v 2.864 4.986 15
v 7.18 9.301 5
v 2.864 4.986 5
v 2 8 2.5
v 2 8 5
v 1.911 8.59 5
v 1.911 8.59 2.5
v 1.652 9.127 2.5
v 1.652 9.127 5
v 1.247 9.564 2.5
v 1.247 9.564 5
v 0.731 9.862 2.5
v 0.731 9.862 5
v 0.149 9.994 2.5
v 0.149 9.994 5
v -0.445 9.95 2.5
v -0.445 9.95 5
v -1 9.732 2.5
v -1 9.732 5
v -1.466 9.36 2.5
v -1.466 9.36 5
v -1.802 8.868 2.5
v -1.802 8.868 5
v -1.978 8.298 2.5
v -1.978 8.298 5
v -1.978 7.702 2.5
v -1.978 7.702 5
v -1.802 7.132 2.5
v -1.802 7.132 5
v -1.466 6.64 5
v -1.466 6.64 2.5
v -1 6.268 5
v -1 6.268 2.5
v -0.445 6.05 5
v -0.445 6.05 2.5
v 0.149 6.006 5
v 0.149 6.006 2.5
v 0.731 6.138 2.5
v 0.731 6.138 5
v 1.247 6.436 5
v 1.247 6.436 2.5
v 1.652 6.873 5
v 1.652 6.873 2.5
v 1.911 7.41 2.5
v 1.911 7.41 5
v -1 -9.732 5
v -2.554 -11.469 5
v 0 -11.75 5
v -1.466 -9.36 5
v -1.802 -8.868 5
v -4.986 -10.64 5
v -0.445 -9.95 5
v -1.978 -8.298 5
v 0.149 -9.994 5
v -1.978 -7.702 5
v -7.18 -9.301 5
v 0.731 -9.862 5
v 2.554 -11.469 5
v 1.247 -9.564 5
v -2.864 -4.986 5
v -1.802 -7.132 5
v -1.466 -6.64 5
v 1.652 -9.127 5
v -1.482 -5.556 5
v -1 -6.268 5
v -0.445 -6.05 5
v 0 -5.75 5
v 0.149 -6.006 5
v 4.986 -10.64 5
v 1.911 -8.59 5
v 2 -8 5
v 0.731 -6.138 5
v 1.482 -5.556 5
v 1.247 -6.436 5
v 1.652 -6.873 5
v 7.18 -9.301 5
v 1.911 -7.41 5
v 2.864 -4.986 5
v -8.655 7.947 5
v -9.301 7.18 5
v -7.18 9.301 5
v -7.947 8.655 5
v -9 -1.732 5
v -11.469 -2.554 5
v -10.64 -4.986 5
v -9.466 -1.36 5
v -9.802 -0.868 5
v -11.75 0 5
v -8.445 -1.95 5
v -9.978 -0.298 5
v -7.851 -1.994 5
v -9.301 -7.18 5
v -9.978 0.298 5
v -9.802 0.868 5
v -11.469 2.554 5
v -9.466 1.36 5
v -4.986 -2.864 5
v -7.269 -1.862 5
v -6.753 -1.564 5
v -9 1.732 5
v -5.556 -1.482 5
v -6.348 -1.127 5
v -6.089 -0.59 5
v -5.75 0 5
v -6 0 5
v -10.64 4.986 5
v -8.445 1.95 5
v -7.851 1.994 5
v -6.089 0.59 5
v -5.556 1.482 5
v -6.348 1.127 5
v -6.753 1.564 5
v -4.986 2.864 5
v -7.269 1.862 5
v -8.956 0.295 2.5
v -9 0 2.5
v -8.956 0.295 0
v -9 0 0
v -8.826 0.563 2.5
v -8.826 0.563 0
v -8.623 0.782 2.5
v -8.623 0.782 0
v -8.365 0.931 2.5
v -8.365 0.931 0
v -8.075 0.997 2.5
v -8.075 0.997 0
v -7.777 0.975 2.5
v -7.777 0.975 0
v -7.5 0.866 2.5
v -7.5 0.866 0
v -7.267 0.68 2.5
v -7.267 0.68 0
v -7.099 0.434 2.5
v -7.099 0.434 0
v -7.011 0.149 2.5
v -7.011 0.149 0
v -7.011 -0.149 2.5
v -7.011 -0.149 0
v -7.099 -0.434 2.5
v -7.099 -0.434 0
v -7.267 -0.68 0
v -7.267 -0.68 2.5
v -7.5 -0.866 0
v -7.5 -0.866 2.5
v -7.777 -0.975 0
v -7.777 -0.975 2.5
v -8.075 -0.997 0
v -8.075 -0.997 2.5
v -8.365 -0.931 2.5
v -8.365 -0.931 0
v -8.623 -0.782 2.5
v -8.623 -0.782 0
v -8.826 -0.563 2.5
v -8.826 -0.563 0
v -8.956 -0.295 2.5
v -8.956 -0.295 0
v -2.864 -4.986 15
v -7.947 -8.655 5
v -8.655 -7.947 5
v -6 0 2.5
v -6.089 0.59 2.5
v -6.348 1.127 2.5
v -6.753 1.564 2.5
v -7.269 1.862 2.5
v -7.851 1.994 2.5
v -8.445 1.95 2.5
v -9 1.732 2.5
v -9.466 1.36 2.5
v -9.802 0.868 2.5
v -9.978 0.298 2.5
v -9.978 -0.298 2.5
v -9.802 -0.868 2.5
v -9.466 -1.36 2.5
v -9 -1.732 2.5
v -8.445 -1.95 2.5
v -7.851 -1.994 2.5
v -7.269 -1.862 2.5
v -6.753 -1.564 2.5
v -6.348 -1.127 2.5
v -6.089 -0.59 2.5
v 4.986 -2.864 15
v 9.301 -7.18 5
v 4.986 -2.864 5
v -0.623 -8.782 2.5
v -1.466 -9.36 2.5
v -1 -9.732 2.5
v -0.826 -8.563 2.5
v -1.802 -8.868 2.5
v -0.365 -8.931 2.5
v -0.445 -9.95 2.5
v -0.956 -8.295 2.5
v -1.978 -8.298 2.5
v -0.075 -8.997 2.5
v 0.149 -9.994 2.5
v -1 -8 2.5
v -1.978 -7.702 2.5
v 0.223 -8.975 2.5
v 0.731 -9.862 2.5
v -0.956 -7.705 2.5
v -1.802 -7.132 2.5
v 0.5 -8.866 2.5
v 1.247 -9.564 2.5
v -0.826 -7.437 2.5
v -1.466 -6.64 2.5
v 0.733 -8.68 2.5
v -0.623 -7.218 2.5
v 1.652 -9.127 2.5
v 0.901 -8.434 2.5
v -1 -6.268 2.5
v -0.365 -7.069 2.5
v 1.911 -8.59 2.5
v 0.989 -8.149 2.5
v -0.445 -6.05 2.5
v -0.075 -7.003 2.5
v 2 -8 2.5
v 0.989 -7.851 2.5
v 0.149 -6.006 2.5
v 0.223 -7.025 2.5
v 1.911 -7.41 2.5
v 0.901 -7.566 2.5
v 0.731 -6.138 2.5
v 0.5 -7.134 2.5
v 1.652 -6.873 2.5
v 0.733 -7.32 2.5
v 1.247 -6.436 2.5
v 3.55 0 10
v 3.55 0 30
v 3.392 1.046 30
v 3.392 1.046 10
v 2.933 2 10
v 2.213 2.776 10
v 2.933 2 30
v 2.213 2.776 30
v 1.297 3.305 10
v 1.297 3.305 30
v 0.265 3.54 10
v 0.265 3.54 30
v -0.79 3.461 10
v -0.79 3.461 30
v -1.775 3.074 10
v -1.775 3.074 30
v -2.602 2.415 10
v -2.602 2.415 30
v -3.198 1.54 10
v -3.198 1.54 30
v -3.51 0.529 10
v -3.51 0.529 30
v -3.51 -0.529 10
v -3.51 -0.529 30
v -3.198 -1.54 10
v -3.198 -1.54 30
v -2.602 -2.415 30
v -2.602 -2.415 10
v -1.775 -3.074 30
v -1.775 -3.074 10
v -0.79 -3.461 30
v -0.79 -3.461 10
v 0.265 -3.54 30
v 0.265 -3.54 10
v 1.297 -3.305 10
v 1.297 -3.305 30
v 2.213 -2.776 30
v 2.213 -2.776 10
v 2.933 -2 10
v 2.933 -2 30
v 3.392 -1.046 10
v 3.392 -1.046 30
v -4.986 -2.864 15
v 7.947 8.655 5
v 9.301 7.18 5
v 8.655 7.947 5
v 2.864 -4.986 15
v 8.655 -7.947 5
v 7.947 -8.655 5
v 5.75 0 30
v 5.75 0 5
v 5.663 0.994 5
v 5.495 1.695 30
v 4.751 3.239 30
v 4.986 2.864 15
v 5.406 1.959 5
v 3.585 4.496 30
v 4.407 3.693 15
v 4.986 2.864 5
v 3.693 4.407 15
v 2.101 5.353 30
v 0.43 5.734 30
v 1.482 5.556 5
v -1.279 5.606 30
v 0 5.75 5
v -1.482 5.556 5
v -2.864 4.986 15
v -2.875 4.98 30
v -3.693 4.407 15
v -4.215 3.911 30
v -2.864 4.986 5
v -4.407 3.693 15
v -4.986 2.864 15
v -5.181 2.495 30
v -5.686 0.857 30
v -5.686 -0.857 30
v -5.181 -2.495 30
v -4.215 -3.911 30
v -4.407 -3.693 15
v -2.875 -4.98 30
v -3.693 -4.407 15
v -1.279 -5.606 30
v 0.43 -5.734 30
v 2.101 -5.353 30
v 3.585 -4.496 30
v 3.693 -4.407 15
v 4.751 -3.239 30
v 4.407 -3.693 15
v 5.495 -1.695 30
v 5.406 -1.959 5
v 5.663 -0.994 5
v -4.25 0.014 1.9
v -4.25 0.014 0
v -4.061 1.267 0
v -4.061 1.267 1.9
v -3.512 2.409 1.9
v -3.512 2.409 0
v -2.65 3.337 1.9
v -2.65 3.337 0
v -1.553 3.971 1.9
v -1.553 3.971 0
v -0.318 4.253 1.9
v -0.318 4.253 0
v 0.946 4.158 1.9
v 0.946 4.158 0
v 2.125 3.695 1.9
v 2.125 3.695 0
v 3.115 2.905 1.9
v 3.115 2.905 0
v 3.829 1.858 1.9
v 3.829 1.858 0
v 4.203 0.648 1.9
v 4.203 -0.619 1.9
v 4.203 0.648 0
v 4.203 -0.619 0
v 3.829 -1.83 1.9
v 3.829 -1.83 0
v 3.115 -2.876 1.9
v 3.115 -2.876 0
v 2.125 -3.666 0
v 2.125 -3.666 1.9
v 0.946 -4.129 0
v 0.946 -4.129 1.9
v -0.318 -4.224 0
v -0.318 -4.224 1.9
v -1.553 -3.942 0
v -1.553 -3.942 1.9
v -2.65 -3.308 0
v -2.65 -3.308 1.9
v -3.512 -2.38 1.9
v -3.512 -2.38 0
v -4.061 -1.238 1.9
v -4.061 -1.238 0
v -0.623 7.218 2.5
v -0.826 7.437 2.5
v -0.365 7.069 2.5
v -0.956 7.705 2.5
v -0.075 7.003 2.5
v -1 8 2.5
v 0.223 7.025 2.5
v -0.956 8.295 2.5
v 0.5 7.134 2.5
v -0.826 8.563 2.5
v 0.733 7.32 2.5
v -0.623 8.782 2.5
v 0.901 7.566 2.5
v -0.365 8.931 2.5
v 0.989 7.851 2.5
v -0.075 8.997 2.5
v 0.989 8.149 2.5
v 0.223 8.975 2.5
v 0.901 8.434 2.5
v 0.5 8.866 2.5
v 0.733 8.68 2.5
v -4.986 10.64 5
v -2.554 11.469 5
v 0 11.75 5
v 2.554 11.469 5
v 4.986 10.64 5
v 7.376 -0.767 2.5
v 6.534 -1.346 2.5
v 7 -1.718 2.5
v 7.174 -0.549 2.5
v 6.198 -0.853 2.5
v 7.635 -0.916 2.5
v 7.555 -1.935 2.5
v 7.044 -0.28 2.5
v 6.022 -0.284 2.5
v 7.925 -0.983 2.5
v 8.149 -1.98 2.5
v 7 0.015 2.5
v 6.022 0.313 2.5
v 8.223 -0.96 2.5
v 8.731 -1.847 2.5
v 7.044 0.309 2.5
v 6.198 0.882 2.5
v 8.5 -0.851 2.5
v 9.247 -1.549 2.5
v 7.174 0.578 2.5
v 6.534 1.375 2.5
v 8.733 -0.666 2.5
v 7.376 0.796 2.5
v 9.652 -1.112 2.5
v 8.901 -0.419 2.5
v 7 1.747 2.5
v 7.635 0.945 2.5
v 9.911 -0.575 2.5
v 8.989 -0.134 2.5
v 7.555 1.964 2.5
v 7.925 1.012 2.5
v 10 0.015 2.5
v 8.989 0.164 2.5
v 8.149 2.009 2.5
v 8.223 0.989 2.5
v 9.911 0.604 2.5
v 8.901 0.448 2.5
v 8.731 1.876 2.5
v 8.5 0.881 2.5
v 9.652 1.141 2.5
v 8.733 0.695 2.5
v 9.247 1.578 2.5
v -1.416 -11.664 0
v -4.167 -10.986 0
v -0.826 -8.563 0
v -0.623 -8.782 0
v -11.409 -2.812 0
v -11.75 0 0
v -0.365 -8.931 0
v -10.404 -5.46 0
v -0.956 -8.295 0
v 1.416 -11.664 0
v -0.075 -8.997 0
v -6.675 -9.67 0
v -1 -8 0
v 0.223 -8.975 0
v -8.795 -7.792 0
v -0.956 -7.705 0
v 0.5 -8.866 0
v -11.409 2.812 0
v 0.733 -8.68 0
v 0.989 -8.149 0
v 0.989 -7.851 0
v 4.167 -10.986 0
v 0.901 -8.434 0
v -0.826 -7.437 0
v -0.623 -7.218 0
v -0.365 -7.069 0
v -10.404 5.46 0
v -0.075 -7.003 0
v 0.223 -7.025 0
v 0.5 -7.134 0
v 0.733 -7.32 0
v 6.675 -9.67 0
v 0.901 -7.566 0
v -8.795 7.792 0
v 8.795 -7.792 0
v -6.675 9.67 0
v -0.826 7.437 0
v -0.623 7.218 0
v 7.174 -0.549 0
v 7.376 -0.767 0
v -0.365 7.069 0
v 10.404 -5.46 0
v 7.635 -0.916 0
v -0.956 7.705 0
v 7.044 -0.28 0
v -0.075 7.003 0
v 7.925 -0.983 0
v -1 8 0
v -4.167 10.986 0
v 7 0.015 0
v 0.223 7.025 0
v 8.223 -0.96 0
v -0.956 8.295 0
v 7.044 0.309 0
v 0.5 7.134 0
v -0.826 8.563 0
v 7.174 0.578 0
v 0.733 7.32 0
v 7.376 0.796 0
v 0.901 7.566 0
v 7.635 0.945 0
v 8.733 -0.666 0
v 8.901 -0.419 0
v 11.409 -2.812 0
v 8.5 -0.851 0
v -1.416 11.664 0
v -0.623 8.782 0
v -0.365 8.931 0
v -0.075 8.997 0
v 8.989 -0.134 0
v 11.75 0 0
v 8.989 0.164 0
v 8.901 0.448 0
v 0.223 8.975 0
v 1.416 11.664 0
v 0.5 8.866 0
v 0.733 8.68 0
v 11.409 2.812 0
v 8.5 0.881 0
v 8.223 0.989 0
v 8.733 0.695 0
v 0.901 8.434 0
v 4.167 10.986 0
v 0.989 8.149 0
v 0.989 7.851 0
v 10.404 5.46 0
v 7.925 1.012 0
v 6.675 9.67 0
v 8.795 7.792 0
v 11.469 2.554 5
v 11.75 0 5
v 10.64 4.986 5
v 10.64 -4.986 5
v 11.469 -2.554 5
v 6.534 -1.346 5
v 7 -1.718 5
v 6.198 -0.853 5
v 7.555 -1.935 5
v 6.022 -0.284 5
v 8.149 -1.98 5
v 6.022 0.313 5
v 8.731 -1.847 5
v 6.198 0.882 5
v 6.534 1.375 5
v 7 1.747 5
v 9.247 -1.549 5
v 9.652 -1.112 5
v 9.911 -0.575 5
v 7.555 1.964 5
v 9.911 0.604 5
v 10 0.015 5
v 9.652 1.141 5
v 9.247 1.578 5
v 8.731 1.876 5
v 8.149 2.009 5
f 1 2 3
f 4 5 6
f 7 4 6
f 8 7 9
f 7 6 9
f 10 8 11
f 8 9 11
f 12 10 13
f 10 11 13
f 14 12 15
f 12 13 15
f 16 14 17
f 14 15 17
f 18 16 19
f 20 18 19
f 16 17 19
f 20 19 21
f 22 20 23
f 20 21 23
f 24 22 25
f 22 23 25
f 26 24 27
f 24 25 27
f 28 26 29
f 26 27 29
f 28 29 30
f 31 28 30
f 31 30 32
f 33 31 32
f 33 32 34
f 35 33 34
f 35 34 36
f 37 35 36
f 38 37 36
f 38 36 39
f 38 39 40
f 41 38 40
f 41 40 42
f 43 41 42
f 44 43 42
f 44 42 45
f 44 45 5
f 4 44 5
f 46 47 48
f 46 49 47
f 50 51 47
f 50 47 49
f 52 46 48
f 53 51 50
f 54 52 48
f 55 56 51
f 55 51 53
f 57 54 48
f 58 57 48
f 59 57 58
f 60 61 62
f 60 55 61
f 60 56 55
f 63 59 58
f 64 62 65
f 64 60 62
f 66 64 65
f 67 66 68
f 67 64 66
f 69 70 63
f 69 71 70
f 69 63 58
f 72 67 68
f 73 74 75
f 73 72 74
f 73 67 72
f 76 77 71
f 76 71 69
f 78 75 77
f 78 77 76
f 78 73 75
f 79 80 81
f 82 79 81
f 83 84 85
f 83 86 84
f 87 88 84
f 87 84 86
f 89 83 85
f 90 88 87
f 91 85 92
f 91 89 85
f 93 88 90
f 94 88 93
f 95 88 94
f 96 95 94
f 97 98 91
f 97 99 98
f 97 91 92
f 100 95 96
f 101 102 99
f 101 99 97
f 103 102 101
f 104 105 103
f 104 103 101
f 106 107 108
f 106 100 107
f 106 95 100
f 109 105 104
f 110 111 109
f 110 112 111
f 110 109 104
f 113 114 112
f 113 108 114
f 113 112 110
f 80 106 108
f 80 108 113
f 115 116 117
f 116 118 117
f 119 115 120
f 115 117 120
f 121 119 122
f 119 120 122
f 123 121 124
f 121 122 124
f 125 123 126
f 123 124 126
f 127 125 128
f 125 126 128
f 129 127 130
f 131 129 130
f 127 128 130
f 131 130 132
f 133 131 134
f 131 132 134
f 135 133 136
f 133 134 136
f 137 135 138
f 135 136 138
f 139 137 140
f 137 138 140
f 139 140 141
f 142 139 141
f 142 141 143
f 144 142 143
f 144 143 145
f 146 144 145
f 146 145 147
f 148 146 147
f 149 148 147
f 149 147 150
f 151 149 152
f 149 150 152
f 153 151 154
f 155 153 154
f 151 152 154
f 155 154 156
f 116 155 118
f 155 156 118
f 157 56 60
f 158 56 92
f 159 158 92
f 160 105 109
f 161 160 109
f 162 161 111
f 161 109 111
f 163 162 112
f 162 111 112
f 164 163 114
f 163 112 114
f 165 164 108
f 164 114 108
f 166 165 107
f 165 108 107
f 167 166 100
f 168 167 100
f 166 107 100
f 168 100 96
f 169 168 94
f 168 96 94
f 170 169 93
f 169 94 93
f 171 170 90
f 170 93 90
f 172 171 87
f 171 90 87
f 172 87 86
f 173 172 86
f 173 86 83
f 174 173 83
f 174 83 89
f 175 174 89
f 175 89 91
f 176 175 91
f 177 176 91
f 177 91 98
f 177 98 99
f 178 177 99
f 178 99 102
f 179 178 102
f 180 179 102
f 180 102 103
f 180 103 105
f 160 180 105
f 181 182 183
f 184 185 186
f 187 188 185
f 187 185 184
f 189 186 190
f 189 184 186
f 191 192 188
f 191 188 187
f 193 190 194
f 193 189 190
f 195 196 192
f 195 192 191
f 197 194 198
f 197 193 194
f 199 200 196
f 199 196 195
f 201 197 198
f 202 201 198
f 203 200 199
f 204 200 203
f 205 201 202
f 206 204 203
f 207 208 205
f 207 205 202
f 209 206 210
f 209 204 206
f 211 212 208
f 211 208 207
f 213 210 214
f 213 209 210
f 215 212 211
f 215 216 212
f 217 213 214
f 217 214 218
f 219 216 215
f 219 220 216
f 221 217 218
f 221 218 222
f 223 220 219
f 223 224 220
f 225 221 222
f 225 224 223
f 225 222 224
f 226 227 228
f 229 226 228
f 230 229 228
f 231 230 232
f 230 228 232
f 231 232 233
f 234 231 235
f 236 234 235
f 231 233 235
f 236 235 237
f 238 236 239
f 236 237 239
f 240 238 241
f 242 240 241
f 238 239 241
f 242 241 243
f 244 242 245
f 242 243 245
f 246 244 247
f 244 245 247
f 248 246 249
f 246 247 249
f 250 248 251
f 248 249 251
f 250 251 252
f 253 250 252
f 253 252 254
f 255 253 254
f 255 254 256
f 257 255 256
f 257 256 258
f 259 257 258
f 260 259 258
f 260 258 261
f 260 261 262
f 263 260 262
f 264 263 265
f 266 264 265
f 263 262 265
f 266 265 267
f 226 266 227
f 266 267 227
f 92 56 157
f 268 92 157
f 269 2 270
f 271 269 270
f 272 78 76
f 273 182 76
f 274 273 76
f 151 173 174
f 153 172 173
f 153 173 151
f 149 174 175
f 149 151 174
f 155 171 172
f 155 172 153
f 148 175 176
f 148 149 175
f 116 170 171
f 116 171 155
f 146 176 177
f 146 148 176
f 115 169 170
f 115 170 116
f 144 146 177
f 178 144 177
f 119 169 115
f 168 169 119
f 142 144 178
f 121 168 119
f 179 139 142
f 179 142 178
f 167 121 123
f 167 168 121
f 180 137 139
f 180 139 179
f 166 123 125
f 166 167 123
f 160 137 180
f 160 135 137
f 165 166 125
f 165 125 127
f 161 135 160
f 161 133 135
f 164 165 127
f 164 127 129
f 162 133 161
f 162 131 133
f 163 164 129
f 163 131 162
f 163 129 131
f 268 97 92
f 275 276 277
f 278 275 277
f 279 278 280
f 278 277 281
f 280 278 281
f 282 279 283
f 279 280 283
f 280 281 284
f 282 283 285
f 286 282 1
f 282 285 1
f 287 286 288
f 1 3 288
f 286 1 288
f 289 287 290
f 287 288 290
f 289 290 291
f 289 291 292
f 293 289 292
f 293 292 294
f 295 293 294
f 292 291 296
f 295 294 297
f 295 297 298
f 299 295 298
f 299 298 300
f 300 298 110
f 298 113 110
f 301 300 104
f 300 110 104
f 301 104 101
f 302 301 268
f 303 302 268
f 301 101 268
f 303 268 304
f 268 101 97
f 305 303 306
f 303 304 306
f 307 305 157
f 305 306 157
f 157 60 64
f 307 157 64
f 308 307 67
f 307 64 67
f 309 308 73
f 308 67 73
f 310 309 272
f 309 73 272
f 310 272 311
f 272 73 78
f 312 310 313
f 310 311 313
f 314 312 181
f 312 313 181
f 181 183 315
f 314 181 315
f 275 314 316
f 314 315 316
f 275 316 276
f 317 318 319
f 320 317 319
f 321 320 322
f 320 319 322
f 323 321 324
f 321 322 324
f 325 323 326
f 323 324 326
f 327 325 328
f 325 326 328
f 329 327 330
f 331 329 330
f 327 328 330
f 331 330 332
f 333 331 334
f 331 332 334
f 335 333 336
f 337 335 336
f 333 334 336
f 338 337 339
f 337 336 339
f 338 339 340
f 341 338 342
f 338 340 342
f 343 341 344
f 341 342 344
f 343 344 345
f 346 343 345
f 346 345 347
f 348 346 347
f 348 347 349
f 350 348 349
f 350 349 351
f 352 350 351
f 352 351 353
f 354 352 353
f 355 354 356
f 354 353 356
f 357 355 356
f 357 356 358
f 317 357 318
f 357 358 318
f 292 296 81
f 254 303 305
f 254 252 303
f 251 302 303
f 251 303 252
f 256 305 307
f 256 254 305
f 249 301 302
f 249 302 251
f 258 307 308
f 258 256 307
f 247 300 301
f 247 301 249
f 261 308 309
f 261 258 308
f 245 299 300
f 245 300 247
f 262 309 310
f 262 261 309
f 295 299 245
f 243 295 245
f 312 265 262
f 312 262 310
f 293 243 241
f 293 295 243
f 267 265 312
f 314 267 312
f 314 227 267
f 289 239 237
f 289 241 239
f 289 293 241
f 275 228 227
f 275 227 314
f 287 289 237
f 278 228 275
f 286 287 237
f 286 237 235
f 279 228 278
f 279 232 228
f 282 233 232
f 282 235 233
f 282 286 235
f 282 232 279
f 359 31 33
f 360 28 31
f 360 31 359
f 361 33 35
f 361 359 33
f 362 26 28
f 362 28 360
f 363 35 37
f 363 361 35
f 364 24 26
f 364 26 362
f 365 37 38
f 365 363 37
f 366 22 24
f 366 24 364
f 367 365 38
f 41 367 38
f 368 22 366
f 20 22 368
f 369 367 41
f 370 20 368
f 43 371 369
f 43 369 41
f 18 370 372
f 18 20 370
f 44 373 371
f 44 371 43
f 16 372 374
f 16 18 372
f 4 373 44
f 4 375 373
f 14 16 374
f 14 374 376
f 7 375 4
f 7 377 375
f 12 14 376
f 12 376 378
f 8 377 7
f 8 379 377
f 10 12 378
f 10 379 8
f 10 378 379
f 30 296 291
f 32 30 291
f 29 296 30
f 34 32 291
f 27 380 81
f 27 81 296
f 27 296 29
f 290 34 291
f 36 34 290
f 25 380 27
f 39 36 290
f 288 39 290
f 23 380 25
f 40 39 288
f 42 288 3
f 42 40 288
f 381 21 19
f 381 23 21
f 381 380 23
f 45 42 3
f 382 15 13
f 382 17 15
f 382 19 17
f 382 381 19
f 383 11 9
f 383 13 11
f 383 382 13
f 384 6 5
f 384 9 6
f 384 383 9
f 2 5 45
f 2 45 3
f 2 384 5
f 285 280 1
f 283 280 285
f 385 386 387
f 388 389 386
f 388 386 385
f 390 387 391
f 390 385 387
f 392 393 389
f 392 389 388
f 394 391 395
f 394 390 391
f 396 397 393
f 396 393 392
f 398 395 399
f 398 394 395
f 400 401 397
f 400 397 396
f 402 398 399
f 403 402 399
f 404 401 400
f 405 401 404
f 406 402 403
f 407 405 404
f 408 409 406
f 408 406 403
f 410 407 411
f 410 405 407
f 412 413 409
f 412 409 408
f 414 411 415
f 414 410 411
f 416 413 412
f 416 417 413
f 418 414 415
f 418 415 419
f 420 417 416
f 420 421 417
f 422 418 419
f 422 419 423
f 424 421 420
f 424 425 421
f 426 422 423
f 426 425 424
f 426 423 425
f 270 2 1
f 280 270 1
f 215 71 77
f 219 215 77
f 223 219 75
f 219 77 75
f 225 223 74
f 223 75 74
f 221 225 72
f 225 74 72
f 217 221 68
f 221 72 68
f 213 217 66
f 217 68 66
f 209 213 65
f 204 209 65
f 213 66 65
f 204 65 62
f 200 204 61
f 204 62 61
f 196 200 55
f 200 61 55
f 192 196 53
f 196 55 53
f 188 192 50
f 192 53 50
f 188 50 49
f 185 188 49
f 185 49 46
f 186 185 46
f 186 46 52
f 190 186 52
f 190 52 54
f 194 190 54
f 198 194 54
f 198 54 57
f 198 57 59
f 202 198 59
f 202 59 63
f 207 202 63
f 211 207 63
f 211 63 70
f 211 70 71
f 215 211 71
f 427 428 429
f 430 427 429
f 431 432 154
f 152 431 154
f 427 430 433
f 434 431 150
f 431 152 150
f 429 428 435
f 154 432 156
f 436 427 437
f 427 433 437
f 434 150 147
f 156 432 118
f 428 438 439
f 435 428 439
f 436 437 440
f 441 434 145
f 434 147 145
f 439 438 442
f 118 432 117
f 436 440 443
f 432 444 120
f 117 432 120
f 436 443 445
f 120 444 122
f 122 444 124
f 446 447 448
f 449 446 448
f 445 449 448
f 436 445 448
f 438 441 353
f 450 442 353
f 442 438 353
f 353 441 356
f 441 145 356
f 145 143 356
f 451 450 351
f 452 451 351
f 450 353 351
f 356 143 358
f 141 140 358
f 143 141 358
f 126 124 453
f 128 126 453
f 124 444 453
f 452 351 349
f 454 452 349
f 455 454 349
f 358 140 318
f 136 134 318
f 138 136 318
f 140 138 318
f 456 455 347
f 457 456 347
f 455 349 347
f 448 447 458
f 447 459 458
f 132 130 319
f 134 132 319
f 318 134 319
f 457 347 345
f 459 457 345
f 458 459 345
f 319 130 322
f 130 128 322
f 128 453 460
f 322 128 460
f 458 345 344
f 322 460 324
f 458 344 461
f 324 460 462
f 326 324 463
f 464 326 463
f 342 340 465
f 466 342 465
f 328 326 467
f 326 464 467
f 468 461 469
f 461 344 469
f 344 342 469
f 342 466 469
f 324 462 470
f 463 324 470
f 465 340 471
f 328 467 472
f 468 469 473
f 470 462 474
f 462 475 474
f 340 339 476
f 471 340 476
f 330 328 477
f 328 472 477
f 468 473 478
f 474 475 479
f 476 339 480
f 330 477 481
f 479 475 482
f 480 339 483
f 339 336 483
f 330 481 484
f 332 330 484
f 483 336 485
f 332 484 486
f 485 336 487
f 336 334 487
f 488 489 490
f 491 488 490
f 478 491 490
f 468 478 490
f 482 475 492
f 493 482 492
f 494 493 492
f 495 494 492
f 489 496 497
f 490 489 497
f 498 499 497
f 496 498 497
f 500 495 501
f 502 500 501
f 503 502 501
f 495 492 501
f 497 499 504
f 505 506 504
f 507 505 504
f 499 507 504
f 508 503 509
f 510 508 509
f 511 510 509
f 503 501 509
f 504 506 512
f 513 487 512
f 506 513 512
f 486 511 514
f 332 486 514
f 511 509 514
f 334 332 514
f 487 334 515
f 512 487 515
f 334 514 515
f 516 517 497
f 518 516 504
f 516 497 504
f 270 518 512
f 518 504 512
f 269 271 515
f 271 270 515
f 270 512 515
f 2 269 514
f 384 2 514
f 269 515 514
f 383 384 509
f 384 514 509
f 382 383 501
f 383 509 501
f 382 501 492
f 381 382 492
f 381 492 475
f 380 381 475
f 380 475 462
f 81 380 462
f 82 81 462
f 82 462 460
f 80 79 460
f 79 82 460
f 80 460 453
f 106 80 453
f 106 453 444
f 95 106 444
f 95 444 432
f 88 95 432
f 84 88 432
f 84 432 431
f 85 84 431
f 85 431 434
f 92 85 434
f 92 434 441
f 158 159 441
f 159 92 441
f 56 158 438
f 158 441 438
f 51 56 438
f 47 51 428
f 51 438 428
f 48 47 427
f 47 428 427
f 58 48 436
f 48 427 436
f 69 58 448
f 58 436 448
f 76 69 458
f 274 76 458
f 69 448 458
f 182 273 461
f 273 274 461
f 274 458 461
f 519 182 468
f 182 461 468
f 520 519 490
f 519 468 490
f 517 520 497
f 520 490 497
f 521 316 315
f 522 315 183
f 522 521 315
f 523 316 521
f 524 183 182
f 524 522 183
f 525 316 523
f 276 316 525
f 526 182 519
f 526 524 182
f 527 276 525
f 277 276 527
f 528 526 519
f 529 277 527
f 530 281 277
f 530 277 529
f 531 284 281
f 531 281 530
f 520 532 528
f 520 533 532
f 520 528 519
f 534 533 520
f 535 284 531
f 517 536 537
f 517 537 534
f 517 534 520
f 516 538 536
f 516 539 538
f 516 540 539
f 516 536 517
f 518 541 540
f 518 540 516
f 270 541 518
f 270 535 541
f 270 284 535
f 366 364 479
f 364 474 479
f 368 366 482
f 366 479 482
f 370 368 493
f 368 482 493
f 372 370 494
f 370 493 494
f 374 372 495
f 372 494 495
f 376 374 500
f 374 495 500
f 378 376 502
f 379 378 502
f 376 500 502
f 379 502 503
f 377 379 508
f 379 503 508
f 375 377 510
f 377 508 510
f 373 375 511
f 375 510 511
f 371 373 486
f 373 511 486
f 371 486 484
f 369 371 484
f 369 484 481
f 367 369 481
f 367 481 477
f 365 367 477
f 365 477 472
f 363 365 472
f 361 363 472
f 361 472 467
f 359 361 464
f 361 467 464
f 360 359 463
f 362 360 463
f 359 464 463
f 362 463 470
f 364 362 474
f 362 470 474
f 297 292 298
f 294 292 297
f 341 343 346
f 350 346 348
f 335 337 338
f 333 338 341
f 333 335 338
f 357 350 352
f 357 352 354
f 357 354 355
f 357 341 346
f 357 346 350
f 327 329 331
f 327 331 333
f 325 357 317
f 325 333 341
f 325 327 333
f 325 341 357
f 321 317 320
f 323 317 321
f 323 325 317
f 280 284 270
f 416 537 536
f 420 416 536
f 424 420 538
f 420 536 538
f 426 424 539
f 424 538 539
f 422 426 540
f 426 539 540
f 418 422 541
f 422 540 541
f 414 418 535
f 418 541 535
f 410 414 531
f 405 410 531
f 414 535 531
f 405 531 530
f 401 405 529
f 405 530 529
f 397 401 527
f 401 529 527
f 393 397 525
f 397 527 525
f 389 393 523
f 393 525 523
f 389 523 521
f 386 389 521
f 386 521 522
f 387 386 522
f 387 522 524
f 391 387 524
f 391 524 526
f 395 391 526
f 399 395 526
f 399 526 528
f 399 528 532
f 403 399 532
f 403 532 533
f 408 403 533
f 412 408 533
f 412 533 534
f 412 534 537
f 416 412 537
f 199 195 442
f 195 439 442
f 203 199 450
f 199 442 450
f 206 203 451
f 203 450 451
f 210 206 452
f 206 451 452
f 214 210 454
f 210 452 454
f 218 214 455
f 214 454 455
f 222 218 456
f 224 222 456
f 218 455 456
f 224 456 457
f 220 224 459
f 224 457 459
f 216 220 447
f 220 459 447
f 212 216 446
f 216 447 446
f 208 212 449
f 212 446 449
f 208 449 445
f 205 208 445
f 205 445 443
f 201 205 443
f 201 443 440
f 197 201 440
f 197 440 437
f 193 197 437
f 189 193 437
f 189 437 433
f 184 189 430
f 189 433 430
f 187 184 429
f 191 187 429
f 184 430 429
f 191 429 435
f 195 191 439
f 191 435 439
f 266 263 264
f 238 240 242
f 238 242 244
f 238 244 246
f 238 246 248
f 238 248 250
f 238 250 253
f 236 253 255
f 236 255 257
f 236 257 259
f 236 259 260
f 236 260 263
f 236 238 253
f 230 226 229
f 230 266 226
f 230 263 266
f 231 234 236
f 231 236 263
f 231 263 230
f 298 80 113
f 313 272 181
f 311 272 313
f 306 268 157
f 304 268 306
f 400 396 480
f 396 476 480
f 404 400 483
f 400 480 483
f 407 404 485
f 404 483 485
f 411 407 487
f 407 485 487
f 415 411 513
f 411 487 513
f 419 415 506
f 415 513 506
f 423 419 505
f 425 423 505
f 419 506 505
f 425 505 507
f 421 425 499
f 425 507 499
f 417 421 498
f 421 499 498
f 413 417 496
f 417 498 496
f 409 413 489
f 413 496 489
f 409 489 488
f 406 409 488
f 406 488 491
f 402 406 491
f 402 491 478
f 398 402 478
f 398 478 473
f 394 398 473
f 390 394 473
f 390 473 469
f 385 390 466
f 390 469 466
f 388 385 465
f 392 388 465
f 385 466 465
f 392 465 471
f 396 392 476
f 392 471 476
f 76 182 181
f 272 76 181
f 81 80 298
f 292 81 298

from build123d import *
from build123d.topology import SkipClean

# Parameters (mm, degrees)
CROQUIS1_R                                           = 11.75
SALIENTE_EXTRUIR1_DEPTH                              = 5
REFRENTADO_PARA_TORNILLO_CON_CABEZA_PLAN_D           = 2
REFRENTADO_PARA_TORNILLO_CON_CABEZA_PLAN_CBORE_D     = 4
REFRENTADO_PARA_TORNILLO_CON_CABEZA_PLAN_CBORE_DEPTH = 2.5
CROQUIS6_R                                           = 4.25
CORTAR_EXTRUIR1_DEPTH                                = 1.9
CROQUIS7_R                                           = 5.75
SALIENTE_EXTRUIR2_DEPTH                              = 15
CROQUIS8_R                                           = 5.75
SALIENTE_EXTRUIR3_DEPTH                              = 10
CROQUIS9_R                                           = 3.55
CORTAR_EXTRUIR2_DEPTH                                = 20
SALIENTE_EXTRUIR4_DEPTH                              = 10
CORTAR_EXTRUIR3_DEPTH                                = 3
MATRIZC1_COUNT                                       = 4


with BuildPart() as part:
    # Croquis1 → Saliente-Extruir1 (new body)
    with BuildSketch(Plane.XY):
        Circle(CROQUIS1_R)
    extrude(amount=SALIENTE_EXTRUIR1_DEPTH)

    # Refrentado para tornillo con cabeza plana de M21 (through all)
    with Locations(Plane(origin=(0, 8, 5), x_dir=(1, 0, 0), z_dir=(0, 0, 1))):
        with Locations((0, 0), (7.999986777, -7.985454569), (0, -16), (-8, -8)):
            CounterBoreHole(REFRENTADO_PARA_TORNILLO_CON_CABEZA_PLAN_D / 2, REFRENTADO_PARA_TORNILLO_CON_CABEZA_PLAN_CBORE_D / 2, REFRENTADO_PARA_TORNILLO_CON_CABEZA_PLAN_CBORE_DEPTH)

    # Croquis6 → Cortar-Extruir1 (cut)
    with BuildSketch(Plane(origin=(0, 0, 0), x_dir=(-1, 0, 0), z_dir=(0, 0, -1))):
        with Locations((0, 0.014473443)):
            Circle(CROQUIS6_R)
    extrude(amount=-CORTAR_EXTRUIR1_DEPTH, mode=Mode.SUBTRACT)

    # Croquis7 → Saliente-Extruir2 (add)
    with BuildSketch(Plane.XY.offset(5)):
        Circle(CROQUIS7_R)
    extrude(amount=SALIENTE_EXTRUIR2_DEPTH)

    # Croquis8 → Saliente-Extruir3 (add)
    with BuildSketch(Plane.XY.offset(20)):
        Circle(CROQUIS8_R)
    extrude(amount=SALIENTE_EXTRUIR3_DEPTH)

    # Croquis9 → Cortar-Extruir2 (cut)
    with BuildSketch(Plane.XY.offset(30)):
        Circle(CROQUIS9_R)
    extrude(amount=-CORTAR_EXTRUIR2_DEPTH, mode=Mode.SUBTRACT)

    # Croquis10 → Saliente-Extruir4 (add)
    with SkipClean():  # the faces are left unmerged after this step: merging them gives an invalid solid
        with BuildSketch(Plane.XY.offset(5)):
            with BuildLine():
                Line((-7.342883246, 5.221562902), (-9.301185034, 7.17986469))
                ThreePointArc((-9.301185034, 7.17986469), (-8.308504679, 8.308504679), (-7.17986469, 9.301185034))
                Line((-7.17986469, 9.301185034), (-5.221562902, 7.342883246))
                Line((-5.221562902, 7.342883246), (-2.864419445, 4.985739789))
                ThreePointArc((-2.864419445, 4.985739789), (-4.065863992, 4.065863992), (-4.985739789, 2.864419445))
                Line((-4.985739789, 2.864419445), (-7.342883246, 5.221562902))
            make_face()
        saliente_extruir4 = extrude(amount=SALIENTE_EXTRUIR4_DEPTH)

    # Croquis11 → Cortar-Extruir3 (cut)
    with BuildSketch(Plane(origin=(-1.060660172, -1.060660172, 0), x_dir=(0, 0, 1), z_dir=(-0.7071067811865472, -0.7071067811865478, 0))):
        Polygon((15, 5.550900828), (15, 11.784165538), (5, 11.780723295), (5, 11.653862021), align=None)
    cortar_extruir3 = extrude(amount=-CORTAR_EXTRUIR3_DEPTH, mode=Mode.SUBTRACT)

    # MatrizC1: Saliente-Extruir4, Cortar-Extruir3 ×4 about axis
    with SkipClean():  # the faces are left unmerged after this step: merging them gives an invalid solid
        matrizc1_axis = Axis((0, 0, 0), (0, 0, 1))
        add([saliente_extruir4.rotate(matrizc1_axis, i * 360 / MATRIZC1_COUNT) for i in range(1, MATRIZC1_COUNT)])
        add([cortar_extruir3.rotate(matrizc1_axis, i * 360 / MATRIZC1_COUNT) for i in range(1, MATRIZC1_COUNT)], mode=Mode.SUBTRACT)


solid = part.part
